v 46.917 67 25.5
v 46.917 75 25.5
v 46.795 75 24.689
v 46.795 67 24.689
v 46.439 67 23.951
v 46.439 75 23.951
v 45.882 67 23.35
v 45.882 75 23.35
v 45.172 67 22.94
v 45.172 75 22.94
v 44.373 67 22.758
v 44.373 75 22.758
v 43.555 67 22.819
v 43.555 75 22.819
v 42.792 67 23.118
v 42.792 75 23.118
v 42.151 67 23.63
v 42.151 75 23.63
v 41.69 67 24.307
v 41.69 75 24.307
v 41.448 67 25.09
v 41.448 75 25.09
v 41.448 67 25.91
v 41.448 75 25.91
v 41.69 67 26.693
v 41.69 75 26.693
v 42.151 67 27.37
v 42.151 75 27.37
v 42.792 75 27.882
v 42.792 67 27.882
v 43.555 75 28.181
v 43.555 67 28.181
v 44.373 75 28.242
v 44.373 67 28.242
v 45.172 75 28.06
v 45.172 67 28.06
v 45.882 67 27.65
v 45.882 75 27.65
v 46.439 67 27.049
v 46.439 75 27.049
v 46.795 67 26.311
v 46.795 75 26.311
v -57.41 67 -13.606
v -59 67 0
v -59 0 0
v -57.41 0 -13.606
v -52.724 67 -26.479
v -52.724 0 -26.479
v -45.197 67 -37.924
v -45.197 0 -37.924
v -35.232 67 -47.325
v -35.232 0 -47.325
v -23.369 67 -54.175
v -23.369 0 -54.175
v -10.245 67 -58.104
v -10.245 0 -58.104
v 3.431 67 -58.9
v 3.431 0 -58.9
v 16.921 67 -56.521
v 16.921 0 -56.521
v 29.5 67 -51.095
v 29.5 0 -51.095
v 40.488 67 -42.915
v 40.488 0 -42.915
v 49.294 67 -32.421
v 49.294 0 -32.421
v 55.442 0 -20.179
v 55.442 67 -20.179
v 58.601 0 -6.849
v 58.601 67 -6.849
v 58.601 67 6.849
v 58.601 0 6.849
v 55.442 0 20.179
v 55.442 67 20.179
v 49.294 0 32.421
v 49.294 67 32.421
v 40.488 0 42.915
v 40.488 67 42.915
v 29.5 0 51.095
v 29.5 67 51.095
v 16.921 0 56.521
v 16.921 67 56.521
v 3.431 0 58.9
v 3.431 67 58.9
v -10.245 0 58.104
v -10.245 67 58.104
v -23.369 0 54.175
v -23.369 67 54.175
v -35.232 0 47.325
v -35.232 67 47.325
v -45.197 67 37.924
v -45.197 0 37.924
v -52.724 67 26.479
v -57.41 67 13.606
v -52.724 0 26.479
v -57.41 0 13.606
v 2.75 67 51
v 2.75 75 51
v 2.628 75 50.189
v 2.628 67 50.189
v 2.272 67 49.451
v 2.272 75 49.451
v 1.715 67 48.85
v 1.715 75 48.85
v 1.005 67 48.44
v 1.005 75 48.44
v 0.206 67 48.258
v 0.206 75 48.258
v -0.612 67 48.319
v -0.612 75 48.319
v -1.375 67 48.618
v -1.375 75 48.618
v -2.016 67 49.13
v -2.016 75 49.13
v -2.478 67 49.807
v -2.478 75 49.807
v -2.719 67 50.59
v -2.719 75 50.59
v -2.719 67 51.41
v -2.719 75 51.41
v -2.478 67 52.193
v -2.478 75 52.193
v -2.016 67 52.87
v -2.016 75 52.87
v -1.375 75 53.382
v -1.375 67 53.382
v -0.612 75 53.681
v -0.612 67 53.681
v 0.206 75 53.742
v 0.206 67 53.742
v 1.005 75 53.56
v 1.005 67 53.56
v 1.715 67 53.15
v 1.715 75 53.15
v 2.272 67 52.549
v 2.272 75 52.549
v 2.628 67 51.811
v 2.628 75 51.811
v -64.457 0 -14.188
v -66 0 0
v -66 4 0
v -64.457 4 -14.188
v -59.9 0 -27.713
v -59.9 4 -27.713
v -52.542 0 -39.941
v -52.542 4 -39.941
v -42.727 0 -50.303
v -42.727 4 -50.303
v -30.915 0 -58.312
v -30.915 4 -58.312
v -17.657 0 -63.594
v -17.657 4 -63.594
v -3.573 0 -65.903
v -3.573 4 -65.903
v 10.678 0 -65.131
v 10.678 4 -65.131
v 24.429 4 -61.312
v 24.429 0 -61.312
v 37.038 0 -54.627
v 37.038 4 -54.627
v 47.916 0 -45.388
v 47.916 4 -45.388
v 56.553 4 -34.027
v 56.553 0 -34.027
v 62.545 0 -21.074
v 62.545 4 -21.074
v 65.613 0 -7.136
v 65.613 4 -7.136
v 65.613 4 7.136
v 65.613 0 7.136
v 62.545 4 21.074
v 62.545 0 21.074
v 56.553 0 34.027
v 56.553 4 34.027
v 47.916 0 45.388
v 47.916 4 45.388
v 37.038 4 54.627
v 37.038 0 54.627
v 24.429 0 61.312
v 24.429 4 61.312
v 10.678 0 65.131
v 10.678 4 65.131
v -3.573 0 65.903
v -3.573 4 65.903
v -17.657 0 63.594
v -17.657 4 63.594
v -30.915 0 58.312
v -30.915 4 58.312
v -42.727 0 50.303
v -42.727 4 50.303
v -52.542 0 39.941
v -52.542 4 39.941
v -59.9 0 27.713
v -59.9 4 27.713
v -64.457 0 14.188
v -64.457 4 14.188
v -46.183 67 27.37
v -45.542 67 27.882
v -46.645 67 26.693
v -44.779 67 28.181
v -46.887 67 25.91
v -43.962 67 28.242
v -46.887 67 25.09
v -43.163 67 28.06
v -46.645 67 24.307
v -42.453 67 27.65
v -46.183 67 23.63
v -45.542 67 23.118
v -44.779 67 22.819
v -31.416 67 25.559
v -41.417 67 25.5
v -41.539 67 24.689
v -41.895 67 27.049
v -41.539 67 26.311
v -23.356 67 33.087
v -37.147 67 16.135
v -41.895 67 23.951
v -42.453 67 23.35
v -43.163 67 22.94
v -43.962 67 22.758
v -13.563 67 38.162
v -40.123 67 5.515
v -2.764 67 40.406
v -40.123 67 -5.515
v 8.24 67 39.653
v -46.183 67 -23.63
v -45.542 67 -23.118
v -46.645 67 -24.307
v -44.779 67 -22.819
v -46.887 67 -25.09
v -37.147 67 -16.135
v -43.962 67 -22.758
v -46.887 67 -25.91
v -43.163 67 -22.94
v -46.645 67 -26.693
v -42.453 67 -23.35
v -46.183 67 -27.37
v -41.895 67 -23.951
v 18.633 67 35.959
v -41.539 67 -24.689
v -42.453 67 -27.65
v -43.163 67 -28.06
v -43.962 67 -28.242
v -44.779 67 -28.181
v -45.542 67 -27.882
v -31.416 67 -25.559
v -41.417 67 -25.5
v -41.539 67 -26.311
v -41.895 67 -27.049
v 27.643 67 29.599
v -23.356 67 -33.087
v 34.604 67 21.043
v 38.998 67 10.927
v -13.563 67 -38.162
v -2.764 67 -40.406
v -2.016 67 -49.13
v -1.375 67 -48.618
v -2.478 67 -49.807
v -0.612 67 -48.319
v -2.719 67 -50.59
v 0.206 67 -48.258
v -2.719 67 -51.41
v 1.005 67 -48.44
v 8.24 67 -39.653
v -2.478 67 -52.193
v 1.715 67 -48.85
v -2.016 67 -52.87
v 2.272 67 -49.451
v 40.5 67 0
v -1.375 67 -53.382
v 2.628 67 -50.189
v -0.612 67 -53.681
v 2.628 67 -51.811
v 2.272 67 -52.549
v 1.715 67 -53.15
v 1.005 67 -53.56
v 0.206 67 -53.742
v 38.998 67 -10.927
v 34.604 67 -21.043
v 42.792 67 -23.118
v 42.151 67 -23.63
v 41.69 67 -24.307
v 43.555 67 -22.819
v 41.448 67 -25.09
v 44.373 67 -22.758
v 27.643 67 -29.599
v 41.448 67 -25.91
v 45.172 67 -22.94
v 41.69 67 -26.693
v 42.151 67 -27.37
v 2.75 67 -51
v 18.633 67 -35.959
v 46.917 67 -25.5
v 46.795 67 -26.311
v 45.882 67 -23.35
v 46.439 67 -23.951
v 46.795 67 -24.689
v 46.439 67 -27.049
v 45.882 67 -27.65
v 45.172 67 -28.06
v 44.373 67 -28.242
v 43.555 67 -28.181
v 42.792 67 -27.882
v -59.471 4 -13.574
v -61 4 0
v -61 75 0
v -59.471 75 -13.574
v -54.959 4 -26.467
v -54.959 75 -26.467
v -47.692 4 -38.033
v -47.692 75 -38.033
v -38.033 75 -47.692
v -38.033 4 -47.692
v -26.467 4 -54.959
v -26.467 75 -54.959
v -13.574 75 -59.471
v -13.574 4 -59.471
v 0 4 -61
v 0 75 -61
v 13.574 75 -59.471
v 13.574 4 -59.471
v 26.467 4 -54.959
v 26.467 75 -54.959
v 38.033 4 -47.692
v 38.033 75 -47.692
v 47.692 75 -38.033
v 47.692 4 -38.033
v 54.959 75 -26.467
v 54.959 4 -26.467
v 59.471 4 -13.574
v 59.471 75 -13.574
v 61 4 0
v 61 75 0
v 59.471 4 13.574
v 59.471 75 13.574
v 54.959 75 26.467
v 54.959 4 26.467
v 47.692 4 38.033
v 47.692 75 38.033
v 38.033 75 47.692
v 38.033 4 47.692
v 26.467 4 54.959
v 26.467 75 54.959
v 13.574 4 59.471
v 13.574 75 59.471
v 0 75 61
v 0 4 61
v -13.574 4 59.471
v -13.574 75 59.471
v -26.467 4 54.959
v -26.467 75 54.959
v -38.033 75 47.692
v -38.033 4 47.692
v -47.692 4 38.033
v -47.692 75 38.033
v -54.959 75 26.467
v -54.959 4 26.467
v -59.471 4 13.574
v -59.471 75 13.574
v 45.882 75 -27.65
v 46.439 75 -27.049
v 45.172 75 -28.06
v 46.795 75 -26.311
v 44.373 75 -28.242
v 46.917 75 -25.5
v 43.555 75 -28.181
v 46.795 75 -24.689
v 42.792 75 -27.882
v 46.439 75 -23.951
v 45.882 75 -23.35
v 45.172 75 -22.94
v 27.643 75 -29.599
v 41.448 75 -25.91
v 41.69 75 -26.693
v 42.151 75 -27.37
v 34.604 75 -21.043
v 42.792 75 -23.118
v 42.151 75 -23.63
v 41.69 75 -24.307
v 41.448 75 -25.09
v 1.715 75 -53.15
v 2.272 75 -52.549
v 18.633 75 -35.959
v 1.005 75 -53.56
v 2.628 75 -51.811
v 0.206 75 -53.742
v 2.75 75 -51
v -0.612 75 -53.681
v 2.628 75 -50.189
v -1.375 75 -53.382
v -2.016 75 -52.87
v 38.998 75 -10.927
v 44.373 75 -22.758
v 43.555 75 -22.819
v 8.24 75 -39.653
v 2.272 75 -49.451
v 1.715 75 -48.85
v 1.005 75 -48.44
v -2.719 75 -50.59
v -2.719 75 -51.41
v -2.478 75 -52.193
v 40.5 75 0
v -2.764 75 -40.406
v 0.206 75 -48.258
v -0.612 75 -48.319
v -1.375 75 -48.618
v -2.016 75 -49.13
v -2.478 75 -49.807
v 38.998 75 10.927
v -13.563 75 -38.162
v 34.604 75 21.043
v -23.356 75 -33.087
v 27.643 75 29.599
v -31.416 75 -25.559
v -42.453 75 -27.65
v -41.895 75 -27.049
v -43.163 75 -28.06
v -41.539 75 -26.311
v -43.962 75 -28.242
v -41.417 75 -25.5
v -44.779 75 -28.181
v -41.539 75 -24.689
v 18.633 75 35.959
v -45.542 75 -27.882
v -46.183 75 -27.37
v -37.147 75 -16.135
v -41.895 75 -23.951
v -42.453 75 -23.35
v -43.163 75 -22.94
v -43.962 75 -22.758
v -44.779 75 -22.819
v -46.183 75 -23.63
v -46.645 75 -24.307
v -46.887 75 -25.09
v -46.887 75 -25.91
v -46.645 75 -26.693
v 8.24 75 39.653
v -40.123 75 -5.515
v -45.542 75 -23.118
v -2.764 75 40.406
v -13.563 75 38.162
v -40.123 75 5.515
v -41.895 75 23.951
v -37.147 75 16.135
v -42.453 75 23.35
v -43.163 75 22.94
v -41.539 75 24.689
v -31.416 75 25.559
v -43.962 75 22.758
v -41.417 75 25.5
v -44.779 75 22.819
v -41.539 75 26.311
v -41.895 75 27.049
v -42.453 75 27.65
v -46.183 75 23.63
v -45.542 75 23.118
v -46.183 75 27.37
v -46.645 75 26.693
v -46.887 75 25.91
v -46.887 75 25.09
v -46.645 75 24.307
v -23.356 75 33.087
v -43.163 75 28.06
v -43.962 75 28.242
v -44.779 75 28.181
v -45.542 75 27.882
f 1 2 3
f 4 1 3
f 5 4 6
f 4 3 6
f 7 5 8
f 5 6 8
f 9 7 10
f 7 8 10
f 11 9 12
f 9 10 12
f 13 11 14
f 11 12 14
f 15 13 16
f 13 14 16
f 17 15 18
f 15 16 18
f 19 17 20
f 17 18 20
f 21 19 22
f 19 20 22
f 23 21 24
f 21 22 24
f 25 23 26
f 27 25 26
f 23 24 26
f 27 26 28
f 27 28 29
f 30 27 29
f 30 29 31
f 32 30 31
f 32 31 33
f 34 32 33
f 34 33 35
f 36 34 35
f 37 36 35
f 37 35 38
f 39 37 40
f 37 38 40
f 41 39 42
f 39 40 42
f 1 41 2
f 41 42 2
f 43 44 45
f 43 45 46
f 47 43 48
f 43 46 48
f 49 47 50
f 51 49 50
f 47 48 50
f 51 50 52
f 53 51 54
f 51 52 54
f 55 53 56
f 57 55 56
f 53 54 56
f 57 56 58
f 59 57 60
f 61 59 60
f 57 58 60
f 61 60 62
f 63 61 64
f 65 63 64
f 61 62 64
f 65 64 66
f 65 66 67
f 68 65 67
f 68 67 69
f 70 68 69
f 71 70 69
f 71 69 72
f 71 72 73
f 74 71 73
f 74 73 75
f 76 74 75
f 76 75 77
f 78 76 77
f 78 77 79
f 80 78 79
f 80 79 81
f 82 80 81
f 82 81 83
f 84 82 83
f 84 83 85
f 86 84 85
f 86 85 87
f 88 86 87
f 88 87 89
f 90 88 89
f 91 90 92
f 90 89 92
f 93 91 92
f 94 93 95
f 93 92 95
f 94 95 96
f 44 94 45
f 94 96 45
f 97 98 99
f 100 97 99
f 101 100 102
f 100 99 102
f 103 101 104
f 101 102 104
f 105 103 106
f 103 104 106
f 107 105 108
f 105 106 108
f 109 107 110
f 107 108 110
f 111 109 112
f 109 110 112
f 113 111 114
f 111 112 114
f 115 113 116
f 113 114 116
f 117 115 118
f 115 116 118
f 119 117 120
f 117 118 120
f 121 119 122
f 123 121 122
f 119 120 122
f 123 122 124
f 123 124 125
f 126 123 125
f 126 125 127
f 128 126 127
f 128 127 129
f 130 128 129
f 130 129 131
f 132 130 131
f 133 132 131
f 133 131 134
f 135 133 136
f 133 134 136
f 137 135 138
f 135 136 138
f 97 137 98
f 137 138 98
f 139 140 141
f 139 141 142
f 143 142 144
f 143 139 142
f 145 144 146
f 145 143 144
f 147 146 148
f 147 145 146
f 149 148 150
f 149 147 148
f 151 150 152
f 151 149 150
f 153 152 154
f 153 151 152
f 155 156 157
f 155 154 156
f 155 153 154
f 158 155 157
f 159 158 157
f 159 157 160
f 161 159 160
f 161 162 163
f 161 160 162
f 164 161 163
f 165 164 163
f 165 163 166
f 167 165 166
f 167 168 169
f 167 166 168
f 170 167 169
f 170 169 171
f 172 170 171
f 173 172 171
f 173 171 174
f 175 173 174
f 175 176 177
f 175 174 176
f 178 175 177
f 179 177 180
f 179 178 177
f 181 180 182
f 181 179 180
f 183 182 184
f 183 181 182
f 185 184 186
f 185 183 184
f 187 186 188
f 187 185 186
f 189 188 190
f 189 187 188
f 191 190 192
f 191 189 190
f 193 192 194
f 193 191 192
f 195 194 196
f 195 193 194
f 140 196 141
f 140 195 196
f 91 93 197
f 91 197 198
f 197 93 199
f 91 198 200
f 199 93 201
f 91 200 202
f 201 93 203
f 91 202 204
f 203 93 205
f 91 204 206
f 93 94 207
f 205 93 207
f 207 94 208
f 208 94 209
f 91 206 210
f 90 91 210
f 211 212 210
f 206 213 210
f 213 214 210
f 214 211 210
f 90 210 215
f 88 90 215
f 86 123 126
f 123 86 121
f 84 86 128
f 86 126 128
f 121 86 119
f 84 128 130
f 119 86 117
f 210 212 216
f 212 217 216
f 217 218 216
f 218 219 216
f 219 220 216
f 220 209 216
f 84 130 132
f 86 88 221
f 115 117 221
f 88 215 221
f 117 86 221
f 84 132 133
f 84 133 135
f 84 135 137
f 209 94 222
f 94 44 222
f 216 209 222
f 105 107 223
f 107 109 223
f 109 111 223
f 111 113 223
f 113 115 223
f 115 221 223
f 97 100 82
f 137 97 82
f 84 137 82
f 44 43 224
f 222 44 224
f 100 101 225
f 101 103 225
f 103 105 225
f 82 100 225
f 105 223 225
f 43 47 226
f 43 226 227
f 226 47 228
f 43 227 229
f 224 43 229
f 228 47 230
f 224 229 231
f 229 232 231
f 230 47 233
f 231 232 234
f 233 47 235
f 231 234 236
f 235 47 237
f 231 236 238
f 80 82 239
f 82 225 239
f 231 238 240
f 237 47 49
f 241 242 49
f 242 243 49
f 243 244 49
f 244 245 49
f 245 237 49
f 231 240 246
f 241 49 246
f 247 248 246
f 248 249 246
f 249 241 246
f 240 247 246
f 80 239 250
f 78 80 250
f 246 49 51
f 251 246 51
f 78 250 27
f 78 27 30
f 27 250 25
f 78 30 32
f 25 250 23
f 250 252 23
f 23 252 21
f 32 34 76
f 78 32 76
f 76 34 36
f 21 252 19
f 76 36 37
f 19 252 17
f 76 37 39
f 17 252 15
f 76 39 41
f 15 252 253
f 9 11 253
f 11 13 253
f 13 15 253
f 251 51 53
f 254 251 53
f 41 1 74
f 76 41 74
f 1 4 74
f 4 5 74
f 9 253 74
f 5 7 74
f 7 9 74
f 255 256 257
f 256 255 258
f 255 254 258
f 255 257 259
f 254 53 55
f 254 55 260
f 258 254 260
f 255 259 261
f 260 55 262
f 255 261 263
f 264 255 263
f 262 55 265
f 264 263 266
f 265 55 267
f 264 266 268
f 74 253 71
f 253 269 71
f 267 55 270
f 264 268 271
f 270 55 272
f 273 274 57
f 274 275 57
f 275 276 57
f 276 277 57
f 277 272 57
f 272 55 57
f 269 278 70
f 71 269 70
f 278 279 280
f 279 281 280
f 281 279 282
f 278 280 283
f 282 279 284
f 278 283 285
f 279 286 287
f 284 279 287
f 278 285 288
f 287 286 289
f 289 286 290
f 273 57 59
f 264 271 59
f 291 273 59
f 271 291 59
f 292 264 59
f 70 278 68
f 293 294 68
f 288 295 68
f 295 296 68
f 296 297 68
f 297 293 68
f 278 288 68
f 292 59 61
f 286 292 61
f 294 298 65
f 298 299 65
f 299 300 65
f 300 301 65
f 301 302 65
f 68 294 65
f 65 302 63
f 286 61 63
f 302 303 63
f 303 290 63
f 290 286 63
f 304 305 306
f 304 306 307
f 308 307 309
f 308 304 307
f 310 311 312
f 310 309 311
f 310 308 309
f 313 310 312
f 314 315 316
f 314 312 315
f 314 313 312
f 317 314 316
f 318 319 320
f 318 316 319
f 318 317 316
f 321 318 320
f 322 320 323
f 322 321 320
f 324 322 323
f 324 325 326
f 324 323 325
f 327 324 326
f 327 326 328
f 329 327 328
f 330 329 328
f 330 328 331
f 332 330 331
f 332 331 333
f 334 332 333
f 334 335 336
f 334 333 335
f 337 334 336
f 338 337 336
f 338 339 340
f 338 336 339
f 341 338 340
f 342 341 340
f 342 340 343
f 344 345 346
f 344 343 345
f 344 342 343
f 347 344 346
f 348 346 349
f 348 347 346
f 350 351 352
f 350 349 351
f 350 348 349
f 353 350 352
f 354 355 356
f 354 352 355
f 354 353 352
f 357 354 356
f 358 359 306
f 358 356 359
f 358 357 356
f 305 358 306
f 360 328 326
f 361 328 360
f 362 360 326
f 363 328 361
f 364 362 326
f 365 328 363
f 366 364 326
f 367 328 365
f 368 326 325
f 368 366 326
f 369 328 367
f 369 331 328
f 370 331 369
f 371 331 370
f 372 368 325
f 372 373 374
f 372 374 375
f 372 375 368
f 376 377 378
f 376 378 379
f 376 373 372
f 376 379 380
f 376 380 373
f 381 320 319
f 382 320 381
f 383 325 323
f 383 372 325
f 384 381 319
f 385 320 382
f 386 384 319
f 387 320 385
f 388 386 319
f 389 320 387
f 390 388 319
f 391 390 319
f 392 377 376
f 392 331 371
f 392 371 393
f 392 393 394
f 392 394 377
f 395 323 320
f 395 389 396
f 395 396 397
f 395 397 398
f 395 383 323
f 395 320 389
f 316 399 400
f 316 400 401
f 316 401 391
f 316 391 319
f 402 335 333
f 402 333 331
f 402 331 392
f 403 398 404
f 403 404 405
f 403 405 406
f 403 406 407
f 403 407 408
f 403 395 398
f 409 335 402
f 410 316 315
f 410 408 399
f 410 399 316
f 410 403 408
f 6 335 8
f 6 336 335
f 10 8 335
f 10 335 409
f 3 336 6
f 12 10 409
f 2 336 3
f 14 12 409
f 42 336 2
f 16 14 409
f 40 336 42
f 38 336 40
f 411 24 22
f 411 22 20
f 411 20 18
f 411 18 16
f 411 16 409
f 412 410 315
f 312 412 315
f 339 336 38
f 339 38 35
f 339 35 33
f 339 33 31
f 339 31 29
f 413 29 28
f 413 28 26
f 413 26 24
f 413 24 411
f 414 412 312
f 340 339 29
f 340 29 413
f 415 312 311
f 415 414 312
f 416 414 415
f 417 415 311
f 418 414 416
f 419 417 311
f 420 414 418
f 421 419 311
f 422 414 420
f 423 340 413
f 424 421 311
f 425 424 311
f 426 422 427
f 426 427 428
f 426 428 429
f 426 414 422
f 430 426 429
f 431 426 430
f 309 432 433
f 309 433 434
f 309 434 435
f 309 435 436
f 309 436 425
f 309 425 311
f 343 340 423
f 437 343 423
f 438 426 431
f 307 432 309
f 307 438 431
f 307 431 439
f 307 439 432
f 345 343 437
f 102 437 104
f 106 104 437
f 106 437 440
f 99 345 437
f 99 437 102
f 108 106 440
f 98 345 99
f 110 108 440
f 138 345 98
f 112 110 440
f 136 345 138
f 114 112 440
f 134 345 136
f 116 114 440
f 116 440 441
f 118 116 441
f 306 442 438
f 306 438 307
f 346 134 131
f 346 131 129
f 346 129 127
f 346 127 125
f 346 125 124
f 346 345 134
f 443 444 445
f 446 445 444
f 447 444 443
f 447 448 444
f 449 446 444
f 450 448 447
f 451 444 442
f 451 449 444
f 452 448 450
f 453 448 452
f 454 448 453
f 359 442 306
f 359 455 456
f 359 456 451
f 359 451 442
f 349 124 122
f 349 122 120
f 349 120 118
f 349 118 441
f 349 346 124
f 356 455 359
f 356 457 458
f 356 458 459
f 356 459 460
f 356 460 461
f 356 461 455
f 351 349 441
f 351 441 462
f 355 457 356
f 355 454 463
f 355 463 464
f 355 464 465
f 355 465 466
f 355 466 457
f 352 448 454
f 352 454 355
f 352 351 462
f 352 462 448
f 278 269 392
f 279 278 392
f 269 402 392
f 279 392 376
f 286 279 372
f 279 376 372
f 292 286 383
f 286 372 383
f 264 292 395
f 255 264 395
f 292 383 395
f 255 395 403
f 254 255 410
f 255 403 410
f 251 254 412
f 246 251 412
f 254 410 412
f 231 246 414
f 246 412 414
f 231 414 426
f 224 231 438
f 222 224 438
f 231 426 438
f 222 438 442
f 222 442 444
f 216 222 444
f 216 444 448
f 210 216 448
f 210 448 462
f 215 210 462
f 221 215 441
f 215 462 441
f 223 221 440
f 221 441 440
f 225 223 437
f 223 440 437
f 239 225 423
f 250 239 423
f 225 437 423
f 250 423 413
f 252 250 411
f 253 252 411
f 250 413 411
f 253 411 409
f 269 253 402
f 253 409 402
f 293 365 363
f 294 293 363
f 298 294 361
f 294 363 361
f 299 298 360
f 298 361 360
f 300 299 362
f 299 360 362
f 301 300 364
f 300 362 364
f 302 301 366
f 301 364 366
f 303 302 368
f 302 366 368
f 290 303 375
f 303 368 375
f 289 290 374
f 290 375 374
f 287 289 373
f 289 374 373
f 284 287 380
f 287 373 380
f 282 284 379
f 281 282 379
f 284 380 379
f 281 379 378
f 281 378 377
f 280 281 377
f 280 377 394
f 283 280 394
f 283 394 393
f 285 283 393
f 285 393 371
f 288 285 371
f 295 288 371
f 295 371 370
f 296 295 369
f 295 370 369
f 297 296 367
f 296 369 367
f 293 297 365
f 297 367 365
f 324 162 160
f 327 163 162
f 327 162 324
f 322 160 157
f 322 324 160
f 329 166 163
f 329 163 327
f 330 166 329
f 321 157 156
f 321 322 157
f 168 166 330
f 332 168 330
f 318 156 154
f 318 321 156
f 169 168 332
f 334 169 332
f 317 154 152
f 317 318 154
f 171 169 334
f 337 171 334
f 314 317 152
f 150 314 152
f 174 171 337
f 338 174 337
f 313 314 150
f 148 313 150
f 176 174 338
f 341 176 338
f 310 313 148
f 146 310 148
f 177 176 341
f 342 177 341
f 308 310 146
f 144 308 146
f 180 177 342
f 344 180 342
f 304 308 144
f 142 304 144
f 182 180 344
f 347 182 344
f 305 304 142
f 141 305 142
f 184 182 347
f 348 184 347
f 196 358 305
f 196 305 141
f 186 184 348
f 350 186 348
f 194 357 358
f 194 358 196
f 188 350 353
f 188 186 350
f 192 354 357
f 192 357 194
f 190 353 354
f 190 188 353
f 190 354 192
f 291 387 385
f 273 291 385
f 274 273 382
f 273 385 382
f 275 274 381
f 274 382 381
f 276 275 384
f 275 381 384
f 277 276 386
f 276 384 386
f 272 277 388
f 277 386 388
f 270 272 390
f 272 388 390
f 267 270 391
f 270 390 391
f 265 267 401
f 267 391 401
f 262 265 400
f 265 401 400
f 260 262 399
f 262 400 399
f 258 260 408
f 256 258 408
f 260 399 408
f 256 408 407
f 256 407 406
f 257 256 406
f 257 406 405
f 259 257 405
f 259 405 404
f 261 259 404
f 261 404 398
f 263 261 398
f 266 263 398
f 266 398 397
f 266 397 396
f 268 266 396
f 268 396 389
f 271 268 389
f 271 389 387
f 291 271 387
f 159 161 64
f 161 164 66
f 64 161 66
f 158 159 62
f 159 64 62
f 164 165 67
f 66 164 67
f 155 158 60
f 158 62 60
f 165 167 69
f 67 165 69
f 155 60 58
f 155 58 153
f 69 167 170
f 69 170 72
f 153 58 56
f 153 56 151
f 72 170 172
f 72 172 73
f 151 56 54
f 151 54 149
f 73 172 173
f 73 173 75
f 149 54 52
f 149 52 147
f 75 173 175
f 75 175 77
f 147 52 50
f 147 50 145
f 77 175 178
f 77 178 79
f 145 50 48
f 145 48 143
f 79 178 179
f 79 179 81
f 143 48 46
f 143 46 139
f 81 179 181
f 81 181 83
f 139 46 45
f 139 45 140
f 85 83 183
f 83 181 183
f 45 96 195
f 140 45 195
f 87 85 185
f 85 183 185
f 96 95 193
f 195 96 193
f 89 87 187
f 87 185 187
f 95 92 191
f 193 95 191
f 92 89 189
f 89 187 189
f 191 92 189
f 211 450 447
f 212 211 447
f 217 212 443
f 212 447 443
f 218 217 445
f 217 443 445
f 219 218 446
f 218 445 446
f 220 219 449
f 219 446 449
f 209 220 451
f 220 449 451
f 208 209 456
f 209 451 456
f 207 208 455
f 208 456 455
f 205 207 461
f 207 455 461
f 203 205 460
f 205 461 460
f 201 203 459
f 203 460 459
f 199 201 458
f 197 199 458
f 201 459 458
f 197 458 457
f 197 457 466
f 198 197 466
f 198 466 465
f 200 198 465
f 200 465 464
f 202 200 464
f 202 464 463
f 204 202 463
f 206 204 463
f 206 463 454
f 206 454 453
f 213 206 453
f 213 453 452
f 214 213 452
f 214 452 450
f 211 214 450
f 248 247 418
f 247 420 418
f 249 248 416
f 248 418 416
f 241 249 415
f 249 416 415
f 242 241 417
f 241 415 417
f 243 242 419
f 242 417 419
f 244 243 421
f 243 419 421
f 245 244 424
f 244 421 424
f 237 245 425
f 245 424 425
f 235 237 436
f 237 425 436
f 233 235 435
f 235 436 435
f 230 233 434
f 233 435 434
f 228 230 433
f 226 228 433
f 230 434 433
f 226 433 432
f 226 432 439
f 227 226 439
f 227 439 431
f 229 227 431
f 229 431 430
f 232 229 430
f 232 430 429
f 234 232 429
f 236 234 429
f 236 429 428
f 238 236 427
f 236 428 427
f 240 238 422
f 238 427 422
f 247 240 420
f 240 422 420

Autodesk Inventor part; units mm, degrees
ref_plane "YZ Plane" through (0, 0, 0) normal (1, 0, 0) x (0, 1, 0)
ref_plane "XZ Plane" through (0, 0, 0) normal (0, 1, 0) x (-1, 0, 0)
sketch "Sketch1" plane through (0, 0, 0) normal (0, 1, 0) x (-1, 0, 0)
  circle A0 centre (0, 0) radius 66
  circle A1 centre (0, 0) radius 61
  circle A2 centre (0, 0) radius 59
  dimension "Absolute_Diameter" = 132
  dimension "Diameter_No_Outer_Lip" = 122
  dimension "Inner_Cylinder_Diameter" = 118
extrude "Extrusion1" add sketch "Sketch1" along normal blind 4 contours A0
extrude "Extrusion2" add sketch "Sketch1" along normal blind 75 contours A1
sketch "Sketch2" plane through (0, 75, 0) normal (0, 1, 0) x (1, 0, 0)
  circle A0 centre (0, 0) radius 40.5
  circle A1 centre (0, 0) radius 61
  dimension "Lip_Diameter_Out" = 81
  dimension "Top_Outer_Lip_Diameter" = 122
extrude "Extrusion7" add sketch "Sketch2" against normal blind 8
ref_plane "Work Plane2" through (0, 10, 0) normal (0, 1, 0) x (1, 0, 0)
sketch "Sketch3" plane through (0, 10, 0) normal (0, 1, 0) x (1, 0, 0)
  circle A0 centre (0, 0) radius 127.5
  circle A1 centre (-127.5, 0) radius 2.5
  circle A2 centre (-103.1497, -74.9426) radius 2.5
  circle A3 centre (-39.3997, -121.2597) radius 2.5
  circle A4 centre (39.3997, -121.2597) radius 2.5
  circle A5 centre (103.1497, -74.9426) radius 2.5
  circle A6 centre (127.5, 0) radius 2.5
  circle A7 centre (103.1497, 74.9426) radius 2.5
  circle A8 centre (39.3997, 121.2597) radius 2.5
  circle A9 centre (-39.3997, 121.2597) radius 2.5
  circle A10 centre (-103.1497, 74.9426) radius 2.5
  dimension "d27" = 255
  dimension "d28" = 5
  dimension "d31" = 360
extrude "Extrusion8" [suppressed]
sketch "Sketch24" plane through (0, 75, 0) normal (0, 1, 0) x (1, 0, 0)
  circle A0 centre (0, 0) radius 51
  circle A1 centre (0, -51) radius 2.75
  circle A2 centre (44.1673, -25.5) radius 2.75
  circle A3 centre (44.1673, 25.5) radius 2.75
  circle A4 centre (0, 51) radius 2.75
  circle A5 centre (-44.1673, 25.5) radius 2.75
  circle A6 centre (-44.1673, -25.5) radius 2.75
  dimension "d230" = 102
  dimension "d231" = 5.5
  dimension "d234" = 360
extrude "Extrusion30" cut sketch "Sketch24" against normal blind 10 contours A3 A0 | A0 A3 | A2 A0 | A0 A2 | A4 A0 | A0 A4 | A1 A0 | A0 A1 | A5 A0 | A0 A5 | A6 A0 | A0 A6
properties part number "Cylinder Replacement- 11"
